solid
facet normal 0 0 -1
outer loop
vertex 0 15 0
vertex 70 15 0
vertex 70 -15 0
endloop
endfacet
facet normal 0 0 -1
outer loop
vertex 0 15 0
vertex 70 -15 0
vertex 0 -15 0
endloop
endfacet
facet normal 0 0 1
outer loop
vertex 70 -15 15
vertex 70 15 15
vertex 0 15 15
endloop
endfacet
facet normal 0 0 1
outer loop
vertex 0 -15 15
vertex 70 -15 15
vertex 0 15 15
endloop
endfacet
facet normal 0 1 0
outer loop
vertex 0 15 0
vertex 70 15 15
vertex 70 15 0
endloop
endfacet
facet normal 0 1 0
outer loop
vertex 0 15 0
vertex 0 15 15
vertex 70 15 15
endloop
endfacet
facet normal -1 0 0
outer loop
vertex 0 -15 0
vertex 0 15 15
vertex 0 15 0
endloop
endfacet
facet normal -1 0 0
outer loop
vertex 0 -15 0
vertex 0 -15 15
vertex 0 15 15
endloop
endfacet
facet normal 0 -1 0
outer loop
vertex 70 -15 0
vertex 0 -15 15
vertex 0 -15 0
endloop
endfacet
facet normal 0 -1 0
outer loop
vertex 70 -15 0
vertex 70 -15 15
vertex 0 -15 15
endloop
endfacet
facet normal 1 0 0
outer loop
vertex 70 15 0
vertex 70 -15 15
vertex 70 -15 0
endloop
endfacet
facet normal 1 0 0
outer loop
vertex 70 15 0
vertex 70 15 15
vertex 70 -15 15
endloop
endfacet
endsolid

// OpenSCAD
width=70;
height = 120;
thickness = 15;
depth = 15;
drillwhole = 7;

linear_extrude(depth){
    difference(){//upper bar
        translate([0,-thickness])
        square([width, 2*thickness]);  //double thickness to create soft edge left bar
        if($t>0.1){
            hull(){ //merge both holes to cut them off
                translate([2*thickness,-thickness])
                circle(d=2*thickness); 
                translate([2*width,-thickness])
                circle(d=2*thickness); 
            }
        }
        if($t>0.2){
            //mounting
            translate([thickness/2,thickness/2,0])
            circle(d=drillwhole); // whole left
            translate([width-thickness,thickness/2,0])
            circle(d=drillwhole); // whole right
        }
    }
    if($t>0.3){
        translate([0,-height/2,0])
        square([thickness, height/2]); // left bar
    }
    translate([width/2,-height/2,0])
    difference(){ //lower part
        if($t>0.4){
            circle(d=width); // outer circle
        }
        if($t>0.5){
            circle(d=width-2*thickness); //cutout circle
        }
        if($t>0.6){
            translate([-(width-2*thickness)/2, 0,0])
            square([width-2*thickness, width/2]); // cut circle top
        }
        if($t>0.7){
            translate([-(width-2*thickness)/2, thickness,0])
            square([width, width/2]); // cut circle right
        }
    }
}
